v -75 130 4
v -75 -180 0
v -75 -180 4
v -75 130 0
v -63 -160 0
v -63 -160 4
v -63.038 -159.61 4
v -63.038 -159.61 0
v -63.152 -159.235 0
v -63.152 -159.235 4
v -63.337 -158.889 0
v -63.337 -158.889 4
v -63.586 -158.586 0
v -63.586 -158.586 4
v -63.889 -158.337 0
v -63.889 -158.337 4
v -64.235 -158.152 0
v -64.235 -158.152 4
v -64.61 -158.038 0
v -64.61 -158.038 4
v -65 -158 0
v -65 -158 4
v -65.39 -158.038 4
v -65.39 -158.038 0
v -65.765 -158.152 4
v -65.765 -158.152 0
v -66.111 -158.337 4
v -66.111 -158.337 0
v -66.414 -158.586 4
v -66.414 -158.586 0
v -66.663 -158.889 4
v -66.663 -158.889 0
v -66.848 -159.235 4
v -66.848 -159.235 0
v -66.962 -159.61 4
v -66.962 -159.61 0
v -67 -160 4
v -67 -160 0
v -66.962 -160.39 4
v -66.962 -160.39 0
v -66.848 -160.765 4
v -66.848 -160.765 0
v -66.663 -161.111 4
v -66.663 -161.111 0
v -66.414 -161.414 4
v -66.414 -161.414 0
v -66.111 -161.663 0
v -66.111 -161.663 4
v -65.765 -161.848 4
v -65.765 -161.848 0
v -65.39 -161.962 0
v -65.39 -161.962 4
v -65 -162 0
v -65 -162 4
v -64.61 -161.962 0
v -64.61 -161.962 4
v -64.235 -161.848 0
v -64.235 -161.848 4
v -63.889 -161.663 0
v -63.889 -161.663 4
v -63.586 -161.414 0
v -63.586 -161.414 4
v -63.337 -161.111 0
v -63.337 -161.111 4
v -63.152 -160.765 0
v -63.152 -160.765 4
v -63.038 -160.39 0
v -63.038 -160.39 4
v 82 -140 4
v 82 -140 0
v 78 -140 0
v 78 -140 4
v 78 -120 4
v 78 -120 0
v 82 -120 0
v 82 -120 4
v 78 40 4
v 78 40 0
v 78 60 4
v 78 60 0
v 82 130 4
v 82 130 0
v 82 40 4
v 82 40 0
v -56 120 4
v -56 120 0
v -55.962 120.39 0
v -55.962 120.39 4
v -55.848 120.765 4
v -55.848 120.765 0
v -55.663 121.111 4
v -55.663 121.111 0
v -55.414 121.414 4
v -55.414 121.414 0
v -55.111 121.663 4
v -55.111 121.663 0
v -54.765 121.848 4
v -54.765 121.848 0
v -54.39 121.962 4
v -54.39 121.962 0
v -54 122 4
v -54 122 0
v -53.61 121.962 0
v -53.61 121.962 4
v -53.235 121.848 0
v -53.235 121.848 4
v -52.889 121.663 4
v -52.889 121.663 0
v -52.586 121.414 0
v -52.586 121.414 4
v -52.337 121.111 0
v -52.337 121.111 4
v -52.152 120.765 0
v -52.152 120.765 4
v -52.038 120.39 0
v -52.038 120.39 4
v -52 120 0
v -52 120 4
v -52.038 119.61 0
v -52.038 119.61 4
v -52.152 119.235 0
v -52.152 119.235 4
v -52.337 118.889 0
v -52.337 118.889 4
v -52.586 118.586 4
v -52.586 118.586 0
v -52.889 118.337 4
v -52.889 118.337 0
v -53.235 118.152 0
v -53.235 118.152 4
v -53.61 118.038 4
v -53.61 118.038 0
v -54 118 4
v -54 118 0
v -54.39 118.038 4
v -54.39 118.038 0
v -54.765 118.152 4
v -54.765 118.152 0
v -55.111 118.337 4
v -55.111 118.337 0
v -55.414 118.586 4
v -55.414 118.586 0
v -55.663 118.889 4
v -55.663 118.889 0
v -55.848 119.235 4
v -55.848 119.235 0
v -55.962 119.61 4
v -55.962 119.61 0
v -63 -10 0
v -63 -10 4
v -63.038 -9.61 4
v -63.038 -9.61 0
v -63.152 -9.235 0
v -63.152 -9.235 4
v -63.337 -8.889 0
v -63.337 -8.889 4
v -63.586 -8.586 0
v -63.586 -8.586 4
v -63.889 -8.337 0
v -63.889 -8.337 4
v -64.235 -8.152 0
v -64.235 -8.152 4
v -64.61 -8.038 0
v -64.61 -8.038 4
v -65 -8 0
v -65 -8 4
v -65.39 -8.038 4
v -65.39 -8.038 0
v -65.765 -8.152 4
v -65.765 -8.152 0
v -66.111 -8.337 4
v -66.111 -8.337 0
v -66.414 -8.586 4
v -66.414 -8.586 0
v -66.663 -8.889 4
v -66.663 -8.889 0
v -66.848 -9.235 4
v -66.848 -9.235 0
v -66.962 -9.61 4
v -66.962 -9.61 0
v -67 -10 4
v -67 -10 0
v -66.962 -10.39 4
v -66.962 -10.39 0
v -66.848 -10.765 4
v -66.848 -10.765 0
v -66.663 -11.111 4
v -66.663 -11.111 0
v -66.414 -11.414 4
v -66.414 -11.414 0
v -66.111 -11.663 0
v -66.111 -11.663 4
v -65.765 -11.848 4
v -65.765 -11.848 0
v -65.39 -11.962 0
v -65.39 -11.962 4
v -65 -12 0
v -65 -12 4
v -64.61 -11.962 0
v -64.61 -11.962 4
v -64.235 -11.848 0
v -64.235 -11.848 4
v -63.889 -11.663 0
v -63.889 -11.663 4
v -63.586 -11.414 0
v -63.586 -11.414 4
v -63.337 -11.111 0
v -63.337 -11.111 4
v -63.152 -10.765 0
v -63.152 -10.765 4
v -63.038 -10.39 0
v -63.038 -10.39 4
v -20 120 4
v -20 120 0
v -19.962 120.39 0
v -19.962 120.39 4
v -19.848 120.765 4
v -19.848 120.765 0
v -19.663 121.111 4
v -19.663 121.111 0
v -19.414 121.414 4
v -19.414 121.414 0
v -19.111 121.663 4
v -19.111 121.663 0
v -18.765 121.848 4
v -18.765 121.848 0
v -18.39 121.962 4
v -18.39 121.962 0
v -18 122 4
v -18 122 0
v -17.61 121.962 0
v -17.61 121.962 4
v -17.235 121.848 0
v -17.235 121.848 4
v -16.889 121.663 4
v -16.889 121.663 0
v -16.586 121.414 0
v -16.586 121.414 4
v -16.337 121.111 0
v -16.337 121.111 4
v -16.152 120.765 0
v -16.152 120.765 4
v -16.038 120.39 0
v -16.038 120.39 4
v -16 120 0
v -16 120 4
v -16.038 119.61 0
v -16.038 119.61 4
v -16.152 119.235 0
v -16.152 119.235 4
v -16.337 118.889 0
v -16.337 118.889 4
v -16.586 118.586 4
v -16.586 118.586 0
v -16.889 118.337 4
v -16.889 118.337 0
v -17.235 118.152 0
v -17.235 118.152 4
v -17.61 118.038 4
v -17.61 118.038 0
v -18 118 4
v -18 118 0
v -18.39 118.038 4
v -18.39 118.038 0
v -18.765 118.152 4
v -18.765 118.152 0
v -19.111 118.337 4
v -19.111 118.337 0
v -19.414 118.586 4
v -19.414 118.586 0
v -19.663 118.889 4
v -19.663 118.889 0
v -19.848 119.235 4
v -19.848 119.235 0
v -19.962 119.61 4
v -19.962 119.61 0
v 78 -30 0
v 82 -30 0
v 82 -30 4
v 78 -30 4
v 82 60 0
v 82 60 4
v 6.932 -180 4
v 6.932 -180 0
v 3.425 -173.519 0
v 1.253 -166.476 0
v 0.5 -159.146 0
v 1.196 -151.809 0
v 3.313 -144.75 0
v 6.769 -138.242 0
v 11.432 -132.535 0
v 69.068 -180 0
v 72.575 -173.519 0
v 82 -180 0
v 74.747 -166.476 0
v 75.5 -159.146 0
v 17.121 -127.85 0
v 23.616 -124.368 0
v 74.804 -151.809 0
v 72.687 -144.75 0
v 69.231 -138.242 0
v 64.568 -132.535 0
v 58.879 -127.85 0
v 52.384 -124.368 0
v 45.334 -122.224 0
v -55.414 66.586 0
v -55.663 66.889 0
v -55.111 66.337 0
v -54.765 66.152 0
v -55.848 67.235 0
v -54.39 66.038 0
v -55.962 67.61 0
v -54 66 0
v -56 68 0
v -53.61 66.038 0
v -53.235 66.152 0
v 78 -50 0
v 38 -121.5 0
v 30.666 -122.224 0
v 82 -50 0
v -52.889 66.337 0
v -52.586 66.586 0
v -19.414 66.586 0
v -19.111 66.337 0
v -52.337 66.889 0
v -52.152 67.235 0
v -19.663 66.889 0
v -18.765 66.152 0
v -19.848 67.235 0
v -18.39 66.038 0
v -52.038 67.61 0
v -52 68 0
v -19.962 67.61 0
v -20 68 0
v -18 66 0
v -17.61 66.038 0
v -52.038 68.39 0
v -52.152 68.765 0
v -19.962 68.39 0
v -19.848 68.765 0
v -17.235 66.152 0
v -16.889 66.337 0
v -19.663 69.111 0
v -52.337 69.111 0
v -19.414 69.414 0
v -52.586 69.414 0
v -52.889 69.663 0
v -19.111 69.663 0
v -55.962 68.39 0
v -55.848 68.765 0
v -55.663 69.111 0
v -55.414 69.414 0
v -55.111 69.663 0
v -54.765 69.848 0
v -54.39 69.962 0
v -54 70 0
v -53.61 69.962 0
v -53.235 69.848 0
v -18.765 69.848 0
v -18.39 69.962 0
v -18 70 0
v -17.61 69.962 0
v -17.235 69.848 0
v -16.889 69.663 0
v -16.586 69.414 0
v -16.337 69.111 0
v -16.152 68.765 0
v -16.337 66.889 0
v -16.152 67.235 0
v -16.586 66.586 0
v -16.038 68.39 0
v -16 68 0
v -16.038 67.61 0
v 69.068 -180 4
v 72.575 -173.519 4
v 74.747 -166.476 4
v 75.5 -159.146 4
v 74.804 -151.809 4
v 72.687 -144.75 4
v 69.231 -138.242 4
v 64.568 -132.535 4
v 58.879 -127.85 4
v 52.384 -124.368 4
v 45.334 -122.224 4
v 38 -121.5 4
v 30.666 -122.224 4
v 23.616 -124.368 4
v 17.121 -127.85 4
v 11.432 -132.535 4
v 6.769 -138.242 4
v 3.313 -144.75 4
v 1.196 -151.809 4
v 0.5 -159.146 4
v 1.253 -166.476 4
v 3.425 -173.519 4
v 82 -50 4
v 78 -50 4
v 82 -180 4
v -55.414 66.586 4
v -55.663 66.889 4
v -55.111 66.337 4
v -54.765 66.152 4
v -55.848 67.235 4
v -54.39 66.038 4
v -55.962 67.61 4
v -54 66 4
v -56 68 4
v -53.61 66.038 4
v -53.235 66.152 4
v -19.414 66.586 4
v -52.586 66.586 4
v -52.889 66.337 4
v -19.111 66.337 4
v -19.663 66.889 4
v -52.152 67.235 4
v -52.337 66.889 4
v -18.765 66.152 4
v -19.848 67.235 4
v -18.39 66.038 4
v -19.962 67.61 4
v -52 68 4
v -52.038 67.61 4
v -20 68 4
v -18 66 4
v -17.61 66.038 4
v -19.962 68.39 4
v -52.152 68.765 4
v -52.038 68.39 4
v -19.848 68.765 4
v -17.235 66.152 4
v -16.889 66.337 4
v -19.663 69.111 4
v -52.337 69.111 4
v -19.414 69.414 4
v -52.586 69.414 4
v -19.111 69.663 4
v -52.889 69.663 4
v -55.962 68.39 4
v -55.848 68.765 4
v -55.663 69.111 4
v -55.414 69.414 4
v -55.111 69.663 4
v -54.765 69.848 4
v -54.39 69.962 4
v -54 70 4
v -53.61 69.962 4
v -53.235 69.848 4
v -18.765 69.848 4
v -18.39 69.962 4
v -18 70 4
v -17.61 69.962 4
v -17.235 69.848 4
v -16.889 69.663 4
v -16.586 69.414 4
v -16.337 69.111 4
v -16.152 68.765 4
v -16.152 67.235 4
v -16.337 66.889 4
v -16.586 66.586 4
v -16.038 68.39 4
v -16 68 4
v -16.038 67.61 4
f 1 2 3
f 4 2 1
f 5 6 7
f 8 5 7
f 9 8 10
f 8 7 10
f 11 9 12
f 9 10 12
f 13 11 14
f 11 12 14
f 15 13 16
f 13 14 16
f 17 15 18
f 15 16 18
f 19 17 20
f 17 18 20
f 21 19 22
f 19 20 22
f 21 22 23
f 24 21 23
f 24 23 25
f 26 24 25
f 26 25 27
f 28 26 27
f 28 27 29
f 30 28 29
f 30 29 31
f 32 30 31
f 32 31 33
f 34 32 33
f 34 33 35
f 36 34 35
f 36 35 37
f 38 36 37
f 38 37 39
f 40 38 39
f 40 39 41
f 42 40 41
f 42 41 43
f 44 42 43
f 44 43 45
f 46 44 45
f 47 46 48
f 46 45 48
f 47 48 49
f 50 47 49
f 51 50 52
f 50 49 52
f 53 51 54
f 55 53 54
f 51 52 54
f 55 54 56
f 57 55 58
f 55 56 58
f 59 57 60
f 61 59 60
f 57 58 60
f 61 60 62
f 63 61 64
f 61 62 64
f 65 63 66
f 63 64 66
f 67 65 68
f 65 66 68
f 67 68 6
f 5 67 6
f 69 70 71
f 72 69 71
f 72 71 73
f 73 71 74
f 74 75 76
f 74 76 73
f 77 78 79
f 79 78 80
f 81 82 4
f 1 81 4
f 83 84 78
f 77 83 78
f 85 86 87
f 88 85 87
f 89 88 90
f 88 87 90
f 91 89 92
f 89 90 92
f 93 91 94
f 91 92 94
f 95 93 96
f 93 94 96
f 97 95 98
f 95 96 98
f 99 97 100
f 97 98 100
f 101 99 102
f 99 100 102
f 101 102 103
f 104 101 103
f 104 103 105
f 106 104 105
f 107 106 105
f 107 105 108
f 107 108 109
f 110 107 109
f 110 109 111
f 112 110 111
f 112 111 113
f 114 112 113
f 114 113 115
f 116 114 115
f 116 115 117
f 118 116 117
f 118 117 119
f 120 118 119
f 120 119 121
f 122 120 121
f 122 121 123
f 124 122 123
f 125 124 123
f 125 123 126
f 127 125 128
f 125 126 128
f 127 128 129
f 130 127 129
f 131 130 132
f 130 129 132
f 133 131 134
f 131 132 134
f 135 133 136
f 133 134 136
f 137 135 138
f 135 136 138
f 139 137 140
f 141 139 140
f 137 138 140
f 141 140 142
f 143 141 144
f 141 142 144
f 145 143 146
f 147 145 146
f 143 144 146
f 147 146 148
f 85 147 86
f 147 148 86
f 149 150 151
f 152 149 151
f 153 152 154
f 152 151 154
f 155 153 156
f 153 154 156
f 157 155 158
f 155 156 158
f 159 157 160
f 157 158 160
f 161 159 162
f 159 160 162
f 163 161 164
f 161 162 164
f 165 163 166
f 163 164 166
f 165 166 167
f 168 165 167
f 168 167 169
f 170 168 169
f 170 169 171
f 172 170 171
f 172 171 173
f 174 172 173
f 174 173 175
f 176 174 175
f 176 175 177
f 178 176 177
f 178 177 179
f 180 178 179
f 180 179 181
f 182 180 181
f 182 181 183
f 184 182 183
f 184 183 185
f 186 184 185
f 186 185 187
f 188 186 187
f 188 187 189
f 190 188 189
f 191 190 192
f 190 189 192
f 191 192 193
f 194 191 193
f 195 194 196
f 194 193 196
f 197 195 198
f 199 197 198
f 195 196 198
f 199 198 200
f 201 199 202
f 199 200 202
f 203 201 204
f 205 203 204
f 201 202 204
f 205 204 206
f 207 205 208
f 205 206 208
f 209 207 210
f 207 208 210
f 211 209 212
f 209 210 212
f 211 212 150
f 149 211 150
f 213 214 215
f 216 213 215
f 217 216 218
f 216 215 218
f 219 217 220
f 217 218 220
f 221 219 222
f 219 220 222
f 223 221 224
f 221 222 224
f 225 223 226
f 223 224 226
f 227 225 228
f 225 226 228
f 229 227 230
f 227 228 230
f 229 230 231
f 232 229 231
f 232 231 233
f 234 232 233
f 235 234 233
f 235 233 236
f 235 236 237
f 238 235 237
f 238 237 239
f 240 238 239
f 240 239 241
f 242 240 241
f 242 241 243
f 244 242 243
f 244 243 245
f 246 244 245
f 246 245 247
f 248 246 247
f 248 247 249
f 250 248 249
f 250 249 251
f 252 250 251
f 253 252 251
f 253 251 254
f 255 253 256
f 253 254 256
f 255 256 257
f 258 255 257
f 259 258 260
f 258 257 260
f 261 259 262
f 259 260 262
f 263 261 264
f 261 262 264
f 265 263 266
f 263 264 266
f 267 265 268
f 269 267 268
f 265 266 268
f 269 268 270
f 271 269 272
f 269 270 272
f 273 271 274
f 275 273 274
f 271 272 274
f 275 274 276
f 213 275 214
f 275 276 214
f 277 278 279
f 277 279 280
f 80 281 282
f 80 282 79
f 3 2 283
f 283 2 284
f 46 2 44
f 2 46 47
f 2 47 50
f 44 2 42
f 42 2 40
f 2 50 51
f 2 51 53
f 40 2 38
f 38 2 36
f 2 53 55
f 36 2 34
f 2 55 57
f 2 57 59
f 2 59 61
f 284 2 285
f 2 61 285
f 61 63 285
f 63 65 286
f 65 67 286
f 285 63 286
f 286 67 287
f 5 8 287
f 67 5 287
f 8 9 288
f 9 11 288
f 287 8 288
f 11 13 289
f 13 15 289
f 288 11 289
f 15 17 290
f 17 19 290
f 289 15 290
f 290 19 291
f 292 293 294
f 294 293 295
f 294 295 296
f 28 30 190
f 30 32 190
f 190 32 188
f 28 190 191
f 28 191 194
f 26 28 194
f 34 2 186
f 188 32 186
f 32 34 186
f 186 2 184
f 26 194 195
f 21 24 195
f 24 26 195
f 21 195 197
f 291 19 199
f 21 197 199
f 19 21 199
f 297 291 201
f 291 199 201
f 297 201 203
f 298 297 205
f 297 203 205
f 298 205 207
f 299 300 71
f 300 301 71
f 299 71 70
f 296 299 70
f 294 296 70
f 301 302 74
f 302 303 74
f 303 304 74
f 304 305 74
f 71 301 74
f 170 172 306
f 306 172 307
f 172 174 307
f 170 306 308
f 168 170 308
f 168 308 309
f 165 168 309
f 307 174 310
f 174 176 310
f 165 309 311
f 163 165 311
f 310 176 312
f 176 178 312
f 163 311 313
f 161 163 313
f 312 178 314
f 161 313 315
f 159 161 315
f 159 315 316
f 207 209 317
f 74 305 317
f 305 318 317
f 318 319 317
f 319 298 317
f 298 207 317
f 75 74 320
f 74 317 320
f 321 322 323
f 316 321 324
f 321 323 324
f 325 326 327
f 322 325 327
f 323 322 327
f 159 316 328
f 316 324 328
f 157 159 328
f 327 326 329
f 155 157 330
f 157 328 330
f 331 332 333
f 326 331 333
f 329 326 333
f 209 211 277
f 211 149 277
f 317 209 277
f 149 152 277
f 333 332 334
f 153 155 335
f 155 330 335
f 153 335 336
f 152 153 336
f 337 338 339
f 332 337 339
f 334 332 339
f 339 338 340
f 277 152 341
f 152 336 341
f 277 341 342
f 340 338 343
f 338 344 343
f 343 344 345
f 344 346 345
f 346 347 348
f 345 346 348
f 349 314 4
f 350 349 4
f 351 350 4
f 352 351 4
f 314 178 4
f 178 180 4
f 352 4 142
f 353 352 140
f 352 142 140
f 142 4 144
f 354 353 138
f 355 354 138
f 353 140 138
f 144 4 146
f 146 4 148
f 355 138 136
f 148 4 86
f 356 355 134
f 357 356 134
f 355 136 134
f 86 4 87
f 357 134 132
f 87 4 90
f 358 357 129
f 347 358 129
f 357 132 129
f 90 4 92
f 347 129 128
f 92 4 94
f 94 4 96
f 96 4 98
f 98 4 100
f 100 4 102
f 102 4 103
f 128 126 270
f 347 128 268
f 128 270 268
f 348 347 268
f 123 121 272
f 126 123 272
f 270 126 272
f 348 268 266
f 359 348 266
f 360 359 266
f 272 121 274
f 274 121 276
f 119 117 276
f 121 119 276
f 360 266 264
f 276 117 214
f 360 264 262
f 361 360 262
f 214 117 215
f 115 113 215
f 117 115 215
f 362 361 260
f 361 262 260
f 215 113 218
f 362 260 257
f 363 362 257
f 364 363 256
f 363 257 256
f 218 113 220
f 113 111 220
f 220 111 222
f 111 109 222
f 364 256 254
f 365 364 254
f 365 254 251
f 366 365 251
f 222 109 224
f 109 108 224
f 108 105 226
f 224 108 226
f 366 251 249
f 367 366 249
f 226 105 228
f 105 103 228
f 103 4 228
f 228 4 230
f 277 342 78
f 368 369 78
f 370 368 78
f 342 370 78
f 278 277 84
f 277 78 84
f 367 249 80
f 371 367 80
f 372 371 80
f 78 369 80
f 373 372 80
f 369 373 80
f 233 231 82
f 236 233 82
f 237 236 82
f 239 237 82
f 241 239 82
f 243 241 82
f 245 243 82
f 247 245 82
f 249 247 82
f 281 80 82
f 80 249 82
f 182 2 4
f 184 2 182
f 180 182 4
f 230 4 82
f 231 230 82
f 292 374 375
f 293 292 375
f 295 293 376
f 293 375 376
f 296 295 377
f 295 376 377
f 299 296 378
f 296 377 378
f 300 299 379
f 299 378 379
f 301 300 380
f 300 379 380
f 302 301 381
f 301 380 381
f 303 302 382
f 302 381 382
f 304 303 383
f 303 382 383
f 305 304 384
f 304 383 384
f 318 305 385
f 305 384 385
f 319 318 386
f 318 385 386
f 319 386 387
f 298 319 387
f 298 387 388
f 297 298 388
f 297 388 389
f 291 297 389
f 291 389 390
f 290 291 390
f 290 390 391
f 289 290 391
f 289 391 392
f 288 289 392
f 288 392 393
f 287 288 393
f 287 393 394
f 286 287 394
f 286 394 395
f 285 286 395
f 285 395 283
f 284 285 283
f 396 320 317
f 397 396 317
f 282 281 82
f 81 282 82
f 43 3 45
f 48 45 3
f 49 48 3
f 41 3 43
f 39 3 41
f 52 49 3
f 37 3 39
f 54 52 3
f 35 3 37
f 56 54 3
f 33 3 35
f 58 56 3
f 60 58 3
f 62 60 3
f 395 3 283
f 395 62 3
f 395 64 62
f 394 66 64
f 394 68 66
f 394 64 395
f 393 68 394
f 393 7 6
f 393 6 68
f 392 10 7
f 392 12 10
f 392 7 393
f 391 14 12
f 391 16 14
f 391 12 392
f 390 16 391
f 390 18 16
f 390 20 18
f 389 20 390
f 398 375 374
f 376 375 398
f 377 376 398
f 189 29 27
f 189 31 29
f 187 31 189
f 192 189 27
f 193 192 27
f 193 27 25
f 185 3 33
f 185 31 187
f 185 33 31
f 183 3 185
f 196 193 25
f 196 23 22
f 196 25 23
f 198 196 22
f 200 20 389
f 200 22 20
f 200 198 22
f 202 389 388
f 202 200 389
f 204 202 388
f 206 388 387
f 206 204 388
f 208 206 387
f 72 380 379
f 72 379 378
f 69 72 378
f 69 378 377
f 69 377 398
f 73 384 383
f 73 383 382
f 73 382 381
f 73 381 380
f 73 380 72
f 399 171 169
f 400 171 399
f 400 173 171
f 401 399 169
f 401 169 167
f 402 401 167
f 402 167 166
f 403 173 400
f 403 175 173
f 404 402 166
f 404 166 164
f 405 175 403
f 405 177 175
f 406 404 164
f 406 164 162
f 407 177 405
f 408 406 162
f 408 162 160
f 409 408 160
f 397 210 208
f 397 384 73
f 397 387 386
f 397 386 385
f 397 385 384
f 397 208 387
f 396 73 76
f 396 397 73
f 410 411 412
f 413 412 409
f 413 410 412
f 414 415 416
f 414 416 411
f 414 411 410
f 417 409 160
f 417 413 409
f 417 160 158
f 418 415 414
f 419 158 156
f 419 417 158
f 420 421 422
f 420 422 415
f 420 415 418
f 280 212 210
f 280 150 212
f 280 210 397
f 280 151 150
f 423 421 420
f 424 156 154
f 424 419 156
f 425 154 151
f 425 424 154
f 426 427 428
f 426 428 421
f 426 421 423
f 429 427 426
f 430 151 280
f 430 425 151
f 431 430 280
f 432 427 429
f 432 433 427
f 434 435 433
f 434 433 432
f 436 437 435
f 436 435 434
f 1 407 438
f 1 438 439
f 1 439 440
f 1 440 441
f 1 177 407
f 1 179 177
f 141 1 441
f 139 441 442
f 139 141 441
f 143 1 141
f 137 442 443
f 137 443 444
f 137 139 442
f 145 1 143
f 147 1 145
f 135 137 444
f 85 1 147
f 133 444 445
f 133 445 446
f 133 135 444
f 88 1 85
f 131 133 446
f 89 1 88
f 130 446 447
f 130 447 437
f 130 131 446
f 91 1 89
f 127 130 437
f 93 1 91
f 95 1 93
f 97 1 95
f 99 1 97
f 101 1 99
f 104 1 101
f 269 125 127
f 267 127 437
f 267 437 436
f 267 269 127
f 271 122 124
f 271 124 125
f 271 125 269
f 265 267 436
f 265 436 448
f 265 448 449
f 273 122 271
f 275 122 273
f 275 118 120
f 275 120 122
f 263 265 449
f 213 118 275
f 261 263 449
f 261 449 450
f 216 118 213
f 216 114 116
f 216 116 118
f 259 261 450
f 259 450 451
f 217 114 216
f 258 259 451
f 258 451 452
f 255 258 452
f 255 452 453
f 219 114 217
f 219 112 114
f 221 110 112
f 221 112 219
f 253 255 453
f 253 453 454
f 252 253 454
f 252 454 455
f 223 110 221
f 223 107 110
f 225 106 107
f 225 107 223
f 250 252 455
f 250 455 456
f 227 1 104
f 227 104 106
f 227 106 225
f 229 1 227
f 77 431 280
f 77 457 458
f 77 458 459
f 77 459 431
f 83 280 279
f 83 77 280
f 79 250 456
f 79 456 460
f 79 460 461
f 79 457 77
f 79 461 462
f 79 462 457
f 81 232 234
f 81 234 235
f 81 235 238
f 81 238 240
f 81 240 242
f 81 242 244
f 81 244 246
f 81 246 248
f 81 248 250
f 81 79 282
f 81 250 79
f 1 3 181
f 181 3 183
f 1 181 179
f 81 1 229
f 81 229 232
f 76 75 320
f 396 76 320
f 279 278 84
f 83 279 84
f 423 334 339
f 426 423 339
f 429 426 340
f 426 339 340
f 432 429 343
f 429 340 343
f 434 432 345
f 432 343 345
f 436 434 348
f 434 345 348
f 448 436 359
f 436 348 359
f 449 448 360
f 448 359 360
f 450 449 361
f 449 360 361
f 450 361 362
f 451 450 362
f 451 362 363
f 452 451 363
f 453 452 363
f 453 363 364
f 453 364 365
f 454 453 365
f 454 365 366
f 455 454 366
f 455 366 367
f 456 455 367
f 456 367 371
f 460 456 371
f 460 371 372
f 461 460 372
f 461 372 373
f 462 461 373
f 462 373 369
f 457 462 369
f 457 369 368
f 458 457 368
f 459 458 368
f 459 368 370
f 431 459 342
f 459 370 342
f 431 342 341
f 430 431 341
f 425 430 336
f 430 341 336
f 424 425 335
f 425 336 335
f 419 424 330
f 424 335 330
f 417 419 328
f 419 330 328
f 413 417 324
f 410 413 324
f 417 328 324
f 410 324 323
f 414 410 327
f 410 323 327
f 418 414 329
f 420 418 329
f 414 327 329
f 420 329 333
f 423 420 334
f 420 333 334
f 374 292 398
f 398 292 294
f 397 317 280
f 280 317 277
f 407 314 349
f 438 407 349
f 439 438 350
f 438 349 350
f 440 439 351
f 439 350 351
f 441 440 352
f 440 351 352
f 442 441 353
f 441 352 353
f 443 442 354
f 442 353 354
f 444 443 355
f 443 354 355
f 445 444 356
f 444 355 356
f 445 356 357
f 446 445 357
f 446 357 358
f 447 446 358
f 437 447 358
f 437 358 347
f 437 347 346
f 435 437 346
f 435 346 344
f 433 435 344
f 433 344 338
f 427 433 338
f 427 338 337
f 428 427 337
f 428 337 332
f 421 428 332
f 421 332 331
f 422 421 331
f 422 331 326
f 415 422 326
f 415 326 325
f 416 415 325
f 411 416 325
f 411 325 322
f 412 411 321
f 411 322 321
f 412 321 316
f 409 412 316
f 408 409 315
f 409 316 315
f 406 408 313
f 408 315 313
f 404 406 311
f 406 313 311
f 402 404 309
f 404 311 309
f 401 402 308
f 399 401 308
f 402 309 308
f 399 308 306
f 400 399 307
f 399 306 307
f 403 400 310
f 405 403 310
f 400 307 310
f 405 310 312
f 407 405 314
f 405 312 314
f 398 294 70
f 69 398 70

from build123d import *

# Parameters (mm, degrees)
SKETCH1_W           = 165
SKETCH1_H           = 330
BOSS_EXTRUDE1_DEPTH = 4
SKETCH2_R           = 37.5
CUT_EXTRUDE1_DEPTH  = 202.285866369
SKETCH4_W           = 8
SKETCH4_H           = 300
CUT_EXTRUDE3_DEPTH  = 202.285866369
SKETCH3_W           = 4
SKETCH3_H           = 20
CUT_EXTRUDE2_DEPTH  = 202.285866369
SKETCH5_W           = 8
SKETCH5_H           = 30
CUT_EXTRUDE4_DEPTH  = 202.285866369
SKETCH6_R           = 2
CUT_EXTRUDE5_DEPTH  = 198.838317825
SKETCH7_R           = 2
CUT_EXTRUDE6_DEPTH  = 198.838317825
SKETCH8_W           = 153
SKETCH8_H           = 20
CUT_EXTRUDE7_DEPTH  = 198.838317825


with BuildPart() as part:
    # Sketch1 → Boss-Extrude1 (new body)
    with BuildSketch(Plane.XY):
        with Locations((7.5, -15)):
            Rectangle(SKETCH1_W, SKETCH1_H)
    extrude(amount=BOSS_EXTRUDE1_DEPTH)

    # Sketch2 → Cut-Extrude1 (cut, through all)
    with BuildSketch(Plane.XY.offset(4)):
        with Locations((38, -159)):
            Circle(SKETCH2_R)
    extrude(amount=-CUT_EXTRUDE1_DEPTH, mode=Mode.SUBTRACT)

    # Sketch4 → Cut-Extrude3 (cut, through all)
    with BuildSketch(Plane(origin=(0, 0, 0), x_dir=(-1, 0, 0), z_dir=(0, 0, -1))):
        with Locations((-86, 0)):
            Rectangle(SKETCH4_W, SKETCH4_H)
    extrude(amount=-CUT_EXTRUDE3_DEPTH, mode=Mode.SUBTRACT)

    # Sketch3 → Cut-Extrude2 (cut, through all)
    with BuildSketch(Plane(origin=(0, 0, 0), x_dir=(-1, 0, 0), z_dir=(0, 0, -1))):
        with Locations((-80, 140)):
            Rectangle(SKETCH3_W, SKETCH3_H)
        with Locations((-80, 50)):
            Rectangle(SKETCH3_W, SKETCH3_H)
        with Locations((-80, -40)):
            Rectangle(SKETCH3_W, SKETCH3_H)
        with Locations((-80, -130)):
            Rectangle(SKETCH3_W, SKETCH3_H)
    extrude(amount=-CUT_EXTRUDE2_DEPTH, mode=Mode.SUBTRACT)

    # Sketch5 → Cut-Extrude4 (cut, through all)
    with BuildSketch(Plane.XY.offset(4)):
        with Locations((86, -165)):
            Rectangle(SKETCH5_W, SKETCH5_H)
    extrude(amount=-CUT_EXTRUDE4_DEPTH, mode=Mode.SUBTRACT)

    # Sketch6 → Cut-Extrude5 (cut, through all)
    with BuildSketch(Plane(origin=(0, 0, 0), x_dir=(-1, 0, 0), z_dir=(0, 0, -1))):
        with Locations((18, 120)):
            Circle(SKETCH6_R)
        with Locations((54, 120)):
            Circle(SKETCH6_R)
        with Locations((18, 68)):
            Circle(SKETCH6_R)
        with Locations((54, 68)):
            Circle(SKETCH6_R)
    extrude(amount=-CUT_EXTRUDE5_DEPTH, mode=Mode.SUBTRACT)

    # Sketch7 → Cut-Extrude6 (cut, through all)
    with BuildSketch(Plane.XY.offset(4)):
        with Locations((-65, 140)):
            Circle(SKETCH7_R)
        with Locations((-65, -10)):
            Circle(SKETCH7_R)
        with Locations((-65, -160)):
            Circle(SKETCH7_R)
    extrude(amount=-CUT_EXTRUDE6_DEPTH, mode=Mode.SUBTRACT)

    # Sketch8 → Cut-Extrude7 (cut, through all)
    with BuildSketch(Plane(origin=(0, 0, 0), x_dir=(-1, 0, 0), z_dir=(0, 0, -1))):
        with Locations((-1.5, 140)):
            Rectangle(SKETCH8_W, SKETCH8_H)
    extrude(amount=-CUT_EXTRUDE7_DEPTH, mode=Mode.SUBTRACT)


solid = part.part
